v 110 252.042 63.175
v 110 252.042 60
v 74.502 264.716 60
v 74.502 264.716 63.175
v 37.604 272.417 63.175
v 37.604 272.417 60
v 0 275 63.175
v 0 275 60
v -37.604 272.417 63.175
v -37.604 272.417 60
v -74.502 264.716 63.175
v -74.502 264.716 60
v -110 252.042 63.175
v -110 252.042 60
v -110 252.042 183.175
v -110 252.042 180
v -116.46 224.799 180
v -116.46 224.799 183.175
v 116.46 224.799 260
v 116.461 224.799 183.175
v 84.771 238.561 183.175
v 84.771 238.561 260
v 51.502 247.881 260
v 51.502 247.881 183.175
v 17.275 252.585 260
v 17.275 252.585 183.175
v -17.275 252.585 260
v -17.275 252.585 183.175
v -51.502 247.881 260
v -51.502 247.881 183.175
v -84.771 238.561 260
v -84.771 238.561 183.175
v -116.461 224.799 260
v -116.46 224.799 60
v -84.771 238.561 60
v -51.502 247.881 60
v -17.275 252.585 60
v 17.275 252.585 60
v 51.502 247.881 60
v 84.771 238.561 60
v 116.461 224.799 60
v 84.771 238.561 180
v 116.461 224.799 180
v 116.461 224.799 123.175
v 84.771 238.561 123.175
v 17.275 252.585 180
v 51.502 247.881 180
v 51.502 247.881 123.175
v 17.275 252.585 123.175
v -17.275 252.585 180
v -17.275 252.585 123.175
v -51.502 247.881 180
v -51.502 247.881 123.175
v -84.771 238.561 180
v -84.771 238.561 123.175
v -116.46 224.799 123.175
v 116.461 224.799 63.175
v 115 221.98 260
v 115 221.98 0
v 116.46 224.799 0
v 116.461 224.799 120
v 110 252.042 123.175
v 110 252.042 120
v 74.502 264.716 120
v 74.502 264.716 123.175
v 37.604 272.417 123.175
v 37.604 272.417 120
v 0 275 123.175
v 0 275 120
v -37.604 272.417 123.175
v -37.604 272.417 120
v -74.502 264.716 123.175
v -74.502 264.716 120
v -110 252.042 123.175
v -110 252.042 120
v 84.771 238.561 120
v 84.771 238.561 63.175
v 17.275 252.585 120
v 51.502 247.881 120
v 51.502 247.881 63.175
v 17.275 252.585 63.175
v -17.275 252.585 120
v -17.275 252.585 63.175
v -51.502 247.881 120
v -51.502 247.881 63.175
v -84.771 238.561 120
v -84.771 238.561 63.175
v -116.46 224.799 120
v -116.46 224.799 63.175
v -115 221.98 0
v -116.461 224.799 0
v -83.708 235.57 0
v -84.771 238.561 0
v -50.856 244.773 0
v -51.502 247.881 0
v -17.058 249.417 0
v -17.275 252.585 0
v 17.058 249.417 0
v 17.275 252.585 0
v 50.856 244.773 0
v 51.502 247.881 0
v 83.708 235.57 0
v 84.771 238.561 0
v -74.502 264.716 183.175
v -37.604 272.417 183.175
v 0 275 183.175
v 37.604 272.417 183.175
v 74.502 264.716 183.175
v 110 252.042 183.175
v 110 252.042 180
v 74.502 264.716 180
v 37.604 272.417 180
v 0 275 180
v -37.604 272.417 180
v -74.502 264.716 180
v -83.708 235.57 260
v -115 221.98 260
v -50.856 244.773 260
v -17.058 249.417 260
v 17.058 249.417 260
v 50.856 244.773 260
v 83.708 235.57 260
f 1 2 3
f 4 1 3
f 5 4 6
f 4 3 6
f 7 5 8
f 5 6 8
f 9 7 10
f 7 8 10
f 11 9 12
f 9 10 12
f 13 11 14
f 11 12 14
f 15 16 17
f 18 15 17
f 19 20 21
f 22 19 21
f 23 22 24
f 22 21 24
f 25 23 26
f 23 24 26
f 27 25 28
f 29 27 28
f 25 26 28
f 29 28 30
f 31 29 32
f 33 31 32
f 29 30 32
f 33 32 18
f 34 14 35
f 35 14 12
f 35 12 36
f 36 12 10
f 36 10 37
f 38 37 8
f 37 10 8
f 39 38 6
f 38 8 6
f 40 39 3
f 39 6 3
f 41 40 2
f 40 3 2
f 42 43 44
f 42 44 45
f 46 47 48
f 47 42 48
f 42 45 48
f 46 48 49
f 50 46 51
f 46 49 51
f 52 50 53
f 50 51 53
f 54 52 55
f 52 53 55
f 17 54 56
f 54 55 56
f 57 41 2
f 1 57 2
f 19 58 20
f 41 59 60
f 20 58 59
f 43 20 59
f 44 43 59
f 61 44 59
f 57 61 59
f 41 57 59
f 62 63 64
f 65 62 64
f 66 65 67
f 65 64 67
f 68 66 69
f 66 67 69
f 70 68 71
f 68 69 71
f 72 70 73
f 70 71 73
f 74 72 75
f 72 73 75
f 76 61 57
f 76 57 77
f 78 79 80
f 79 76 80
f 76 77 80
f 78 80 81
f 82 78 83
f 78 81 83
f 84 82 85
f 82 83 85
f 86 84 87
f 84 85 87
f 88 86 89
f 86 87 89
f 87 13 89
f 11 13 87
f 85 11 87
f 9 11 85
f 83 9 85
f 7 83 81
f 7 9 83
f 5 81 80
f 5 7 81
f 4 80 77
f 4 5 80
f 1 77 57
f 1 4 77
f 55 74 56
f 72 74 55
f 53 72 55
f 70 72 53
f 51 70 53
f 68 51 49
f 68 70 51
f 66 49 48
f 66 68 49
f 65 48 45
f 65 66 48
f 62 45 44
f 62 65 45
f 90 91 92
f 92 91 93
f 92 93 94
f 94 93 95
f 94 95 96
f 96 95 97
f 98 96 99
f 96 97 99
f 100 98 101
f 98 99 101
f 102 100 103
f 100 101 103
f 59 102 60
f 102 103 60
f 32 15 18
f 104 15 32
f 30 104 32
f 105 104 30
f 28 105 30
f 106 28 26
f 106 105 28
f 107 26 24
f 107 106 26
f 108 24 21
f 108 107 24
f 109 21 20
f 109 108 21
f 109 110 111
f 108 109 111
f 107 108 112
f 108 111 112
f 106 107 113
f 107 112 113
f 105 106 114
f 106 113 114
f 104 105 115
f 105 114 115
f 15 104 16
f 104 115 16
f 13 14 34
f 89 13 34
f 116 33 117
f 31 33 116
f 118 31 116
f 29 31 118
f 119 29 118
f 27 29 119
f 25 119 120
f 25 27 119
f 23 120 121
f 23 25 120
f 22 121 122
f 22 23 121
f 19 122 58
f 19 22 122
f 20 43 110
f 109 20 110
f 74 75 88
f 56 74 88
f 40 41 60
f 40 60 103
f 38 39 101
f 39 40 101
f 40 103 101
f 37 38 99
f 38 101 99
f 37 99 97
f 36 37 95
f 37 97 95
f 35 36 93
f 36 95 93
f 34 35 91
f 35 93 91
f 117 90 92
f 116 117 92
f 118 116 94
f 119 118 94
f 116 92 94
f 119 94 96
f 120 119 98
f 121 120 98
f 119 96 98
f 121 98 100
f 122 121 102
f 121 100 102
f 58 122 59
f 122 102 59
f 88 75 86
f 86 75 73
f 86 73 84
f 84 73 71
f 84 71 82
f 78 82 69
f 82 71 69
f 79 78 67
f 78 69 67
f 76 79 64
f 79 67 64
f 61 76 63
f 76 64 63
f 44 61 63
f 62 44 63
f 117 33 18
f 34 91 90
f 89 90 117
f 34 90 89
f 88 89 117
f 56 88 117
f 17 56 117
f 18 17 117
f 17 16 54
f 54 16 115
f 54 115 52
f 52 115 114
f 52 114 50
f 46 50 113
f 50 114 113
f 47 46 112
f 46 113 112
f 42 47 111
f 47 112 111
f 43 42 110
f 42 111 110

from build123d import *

# Parameters (mm, degrees)
BOSS_EXTRUDE1_DEPTH = 260
BOSS_EXTRUDE2_START = 60
BOSS_EXTRUDE2_DEPTH = 3.175
LPATTERN1_COUNT     = 3
LPATTERN1_PITCH     = 60


with BuildPart() as part:
    # Sketch1 → Boss-Extrude1 (new body)
    with BuildSketch(Plane.XY):
        with BuildLine():
            Line((-116.4605, 224.79887136), (-115, 221.979728804))
            ThreePointArc((-115, 221.979728804), (0, 250), (115, 221.979728804))
            Line((115, 221.979728804), (116.4605, 224.79887136))
            ThreePointArc((116.4605, 224.79887136), (0, 253.175), (-116.4605, 224.79887136))
        make_face()
    extrude(amount=BOSS_EXTRUDE1_DEPTH)

    # Sketch2 → Boss-Extrude2 (add)
    with BuildSketch(Plane.XY.offset(BOSS_EXTRUDE2_START)):
        with BuildLine():
            Line((-110, 252.041663223), (-116.4605, 224.79887136))
            ThreePointArc((-116.4605, 224.79887136), (0, 253.175), (116.4605, 224.79887136))
            Line((116.4605, 224.79887136), (110, 252.041663223))
            ThreePointArc((110, 252.041663223), (0, 275), (-110, 252.041663223))
        make_face()
    boss_extrude2 = extrude(amount=BOSS_EXTRUDE2_DEPTH)

    # LPattern1: Boss-Extrude2 ×3
    with Locations(*[(0, 0, i * LPATTERN1_PITCH) for i in range(1, LPATTERN1_COUNT)]):
        add(boss_extrude2)


solid = part.part
